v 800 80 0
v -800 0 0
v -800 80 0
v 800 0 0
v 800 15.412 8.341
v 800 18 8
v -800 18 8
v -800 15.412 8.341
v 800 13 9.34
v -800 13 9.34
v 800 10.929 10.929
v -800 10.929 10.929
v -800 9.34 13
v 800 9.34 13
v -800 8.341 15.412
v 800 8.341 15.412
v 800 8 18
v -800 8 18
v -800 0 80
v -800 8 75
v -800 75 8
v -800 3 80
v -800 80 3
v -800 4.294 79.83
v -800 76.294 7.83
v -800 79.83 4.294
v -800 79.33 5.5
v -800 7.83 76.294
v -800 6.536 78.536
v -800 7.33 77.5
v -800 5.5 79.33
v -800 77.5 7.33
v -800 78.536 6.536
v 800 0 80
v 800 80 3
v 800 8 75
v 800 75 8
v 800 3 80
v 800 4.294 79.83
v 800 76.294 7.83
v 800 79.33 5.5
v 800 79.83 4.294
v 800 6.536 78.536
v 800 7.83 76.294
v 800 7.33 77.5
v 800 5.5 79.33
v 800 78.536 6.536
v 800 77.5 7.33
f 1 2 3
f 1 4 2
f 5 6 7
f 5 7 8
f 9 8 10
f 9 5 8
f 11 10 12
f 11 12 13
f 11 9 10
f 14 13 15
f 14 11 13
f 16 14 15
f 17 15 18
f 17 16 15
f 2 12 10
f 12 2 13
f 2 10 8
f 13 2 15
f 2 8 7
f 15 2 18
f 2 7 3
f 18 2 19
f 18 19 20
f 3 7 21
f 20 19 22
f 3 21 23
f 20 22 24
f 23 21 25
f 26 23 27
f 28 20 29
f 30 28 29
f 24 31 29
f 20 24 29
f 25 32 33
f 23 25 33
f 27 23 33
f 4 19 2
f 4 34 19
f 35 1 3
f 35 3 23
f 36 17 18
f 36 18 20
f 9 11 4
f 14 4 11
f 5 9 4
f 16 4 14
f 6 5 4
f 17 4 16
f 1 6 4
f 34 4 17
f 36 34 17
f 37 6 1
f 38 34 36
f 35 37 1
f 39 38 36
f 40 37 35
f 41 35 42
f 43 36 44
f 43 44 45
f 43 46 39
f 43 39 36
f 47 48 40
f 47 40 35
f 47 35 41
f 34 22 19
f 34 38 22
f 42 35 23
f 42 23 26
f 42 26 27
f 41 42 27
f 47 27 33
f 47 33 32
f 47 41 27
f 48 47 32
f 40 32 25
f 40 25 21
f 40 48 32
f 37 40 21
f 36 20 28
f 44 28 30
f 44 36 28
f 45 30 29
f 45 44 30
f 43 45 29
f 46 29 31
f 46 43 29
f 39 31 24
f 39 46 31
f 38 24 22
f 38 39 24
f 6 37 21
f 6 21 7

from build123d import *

# Parameters (mm, degrees)
F1_DEPTH = 800


with BuildPart() as f1:
    # F0 (on Right) → F1 (new body, symmetric)
    with BuildSketch(Plane.YZ):
        with BuildLine():
            Line((0, 0), (80, 0))
            Line((80, 0), (80, 3))
            ThreePointArc((80, 3), (78.535534, 6.535534), (75, 8))
            Line((75, 8), (18, 8))
            ThreePointArc((18, 8), (10.928932, 10.928932), (8, 18))
            Line((8, 18), (8, 75))
            ThreePointArc((8, 75), (6.535534, 78.535534), (3, 80))
            Line((3, 80), (0, 80))
            Line((0, 80), (0, 0))
        make_face()
    extrude(amount=F1_DEPTH, both=True)


solid = f1.part
